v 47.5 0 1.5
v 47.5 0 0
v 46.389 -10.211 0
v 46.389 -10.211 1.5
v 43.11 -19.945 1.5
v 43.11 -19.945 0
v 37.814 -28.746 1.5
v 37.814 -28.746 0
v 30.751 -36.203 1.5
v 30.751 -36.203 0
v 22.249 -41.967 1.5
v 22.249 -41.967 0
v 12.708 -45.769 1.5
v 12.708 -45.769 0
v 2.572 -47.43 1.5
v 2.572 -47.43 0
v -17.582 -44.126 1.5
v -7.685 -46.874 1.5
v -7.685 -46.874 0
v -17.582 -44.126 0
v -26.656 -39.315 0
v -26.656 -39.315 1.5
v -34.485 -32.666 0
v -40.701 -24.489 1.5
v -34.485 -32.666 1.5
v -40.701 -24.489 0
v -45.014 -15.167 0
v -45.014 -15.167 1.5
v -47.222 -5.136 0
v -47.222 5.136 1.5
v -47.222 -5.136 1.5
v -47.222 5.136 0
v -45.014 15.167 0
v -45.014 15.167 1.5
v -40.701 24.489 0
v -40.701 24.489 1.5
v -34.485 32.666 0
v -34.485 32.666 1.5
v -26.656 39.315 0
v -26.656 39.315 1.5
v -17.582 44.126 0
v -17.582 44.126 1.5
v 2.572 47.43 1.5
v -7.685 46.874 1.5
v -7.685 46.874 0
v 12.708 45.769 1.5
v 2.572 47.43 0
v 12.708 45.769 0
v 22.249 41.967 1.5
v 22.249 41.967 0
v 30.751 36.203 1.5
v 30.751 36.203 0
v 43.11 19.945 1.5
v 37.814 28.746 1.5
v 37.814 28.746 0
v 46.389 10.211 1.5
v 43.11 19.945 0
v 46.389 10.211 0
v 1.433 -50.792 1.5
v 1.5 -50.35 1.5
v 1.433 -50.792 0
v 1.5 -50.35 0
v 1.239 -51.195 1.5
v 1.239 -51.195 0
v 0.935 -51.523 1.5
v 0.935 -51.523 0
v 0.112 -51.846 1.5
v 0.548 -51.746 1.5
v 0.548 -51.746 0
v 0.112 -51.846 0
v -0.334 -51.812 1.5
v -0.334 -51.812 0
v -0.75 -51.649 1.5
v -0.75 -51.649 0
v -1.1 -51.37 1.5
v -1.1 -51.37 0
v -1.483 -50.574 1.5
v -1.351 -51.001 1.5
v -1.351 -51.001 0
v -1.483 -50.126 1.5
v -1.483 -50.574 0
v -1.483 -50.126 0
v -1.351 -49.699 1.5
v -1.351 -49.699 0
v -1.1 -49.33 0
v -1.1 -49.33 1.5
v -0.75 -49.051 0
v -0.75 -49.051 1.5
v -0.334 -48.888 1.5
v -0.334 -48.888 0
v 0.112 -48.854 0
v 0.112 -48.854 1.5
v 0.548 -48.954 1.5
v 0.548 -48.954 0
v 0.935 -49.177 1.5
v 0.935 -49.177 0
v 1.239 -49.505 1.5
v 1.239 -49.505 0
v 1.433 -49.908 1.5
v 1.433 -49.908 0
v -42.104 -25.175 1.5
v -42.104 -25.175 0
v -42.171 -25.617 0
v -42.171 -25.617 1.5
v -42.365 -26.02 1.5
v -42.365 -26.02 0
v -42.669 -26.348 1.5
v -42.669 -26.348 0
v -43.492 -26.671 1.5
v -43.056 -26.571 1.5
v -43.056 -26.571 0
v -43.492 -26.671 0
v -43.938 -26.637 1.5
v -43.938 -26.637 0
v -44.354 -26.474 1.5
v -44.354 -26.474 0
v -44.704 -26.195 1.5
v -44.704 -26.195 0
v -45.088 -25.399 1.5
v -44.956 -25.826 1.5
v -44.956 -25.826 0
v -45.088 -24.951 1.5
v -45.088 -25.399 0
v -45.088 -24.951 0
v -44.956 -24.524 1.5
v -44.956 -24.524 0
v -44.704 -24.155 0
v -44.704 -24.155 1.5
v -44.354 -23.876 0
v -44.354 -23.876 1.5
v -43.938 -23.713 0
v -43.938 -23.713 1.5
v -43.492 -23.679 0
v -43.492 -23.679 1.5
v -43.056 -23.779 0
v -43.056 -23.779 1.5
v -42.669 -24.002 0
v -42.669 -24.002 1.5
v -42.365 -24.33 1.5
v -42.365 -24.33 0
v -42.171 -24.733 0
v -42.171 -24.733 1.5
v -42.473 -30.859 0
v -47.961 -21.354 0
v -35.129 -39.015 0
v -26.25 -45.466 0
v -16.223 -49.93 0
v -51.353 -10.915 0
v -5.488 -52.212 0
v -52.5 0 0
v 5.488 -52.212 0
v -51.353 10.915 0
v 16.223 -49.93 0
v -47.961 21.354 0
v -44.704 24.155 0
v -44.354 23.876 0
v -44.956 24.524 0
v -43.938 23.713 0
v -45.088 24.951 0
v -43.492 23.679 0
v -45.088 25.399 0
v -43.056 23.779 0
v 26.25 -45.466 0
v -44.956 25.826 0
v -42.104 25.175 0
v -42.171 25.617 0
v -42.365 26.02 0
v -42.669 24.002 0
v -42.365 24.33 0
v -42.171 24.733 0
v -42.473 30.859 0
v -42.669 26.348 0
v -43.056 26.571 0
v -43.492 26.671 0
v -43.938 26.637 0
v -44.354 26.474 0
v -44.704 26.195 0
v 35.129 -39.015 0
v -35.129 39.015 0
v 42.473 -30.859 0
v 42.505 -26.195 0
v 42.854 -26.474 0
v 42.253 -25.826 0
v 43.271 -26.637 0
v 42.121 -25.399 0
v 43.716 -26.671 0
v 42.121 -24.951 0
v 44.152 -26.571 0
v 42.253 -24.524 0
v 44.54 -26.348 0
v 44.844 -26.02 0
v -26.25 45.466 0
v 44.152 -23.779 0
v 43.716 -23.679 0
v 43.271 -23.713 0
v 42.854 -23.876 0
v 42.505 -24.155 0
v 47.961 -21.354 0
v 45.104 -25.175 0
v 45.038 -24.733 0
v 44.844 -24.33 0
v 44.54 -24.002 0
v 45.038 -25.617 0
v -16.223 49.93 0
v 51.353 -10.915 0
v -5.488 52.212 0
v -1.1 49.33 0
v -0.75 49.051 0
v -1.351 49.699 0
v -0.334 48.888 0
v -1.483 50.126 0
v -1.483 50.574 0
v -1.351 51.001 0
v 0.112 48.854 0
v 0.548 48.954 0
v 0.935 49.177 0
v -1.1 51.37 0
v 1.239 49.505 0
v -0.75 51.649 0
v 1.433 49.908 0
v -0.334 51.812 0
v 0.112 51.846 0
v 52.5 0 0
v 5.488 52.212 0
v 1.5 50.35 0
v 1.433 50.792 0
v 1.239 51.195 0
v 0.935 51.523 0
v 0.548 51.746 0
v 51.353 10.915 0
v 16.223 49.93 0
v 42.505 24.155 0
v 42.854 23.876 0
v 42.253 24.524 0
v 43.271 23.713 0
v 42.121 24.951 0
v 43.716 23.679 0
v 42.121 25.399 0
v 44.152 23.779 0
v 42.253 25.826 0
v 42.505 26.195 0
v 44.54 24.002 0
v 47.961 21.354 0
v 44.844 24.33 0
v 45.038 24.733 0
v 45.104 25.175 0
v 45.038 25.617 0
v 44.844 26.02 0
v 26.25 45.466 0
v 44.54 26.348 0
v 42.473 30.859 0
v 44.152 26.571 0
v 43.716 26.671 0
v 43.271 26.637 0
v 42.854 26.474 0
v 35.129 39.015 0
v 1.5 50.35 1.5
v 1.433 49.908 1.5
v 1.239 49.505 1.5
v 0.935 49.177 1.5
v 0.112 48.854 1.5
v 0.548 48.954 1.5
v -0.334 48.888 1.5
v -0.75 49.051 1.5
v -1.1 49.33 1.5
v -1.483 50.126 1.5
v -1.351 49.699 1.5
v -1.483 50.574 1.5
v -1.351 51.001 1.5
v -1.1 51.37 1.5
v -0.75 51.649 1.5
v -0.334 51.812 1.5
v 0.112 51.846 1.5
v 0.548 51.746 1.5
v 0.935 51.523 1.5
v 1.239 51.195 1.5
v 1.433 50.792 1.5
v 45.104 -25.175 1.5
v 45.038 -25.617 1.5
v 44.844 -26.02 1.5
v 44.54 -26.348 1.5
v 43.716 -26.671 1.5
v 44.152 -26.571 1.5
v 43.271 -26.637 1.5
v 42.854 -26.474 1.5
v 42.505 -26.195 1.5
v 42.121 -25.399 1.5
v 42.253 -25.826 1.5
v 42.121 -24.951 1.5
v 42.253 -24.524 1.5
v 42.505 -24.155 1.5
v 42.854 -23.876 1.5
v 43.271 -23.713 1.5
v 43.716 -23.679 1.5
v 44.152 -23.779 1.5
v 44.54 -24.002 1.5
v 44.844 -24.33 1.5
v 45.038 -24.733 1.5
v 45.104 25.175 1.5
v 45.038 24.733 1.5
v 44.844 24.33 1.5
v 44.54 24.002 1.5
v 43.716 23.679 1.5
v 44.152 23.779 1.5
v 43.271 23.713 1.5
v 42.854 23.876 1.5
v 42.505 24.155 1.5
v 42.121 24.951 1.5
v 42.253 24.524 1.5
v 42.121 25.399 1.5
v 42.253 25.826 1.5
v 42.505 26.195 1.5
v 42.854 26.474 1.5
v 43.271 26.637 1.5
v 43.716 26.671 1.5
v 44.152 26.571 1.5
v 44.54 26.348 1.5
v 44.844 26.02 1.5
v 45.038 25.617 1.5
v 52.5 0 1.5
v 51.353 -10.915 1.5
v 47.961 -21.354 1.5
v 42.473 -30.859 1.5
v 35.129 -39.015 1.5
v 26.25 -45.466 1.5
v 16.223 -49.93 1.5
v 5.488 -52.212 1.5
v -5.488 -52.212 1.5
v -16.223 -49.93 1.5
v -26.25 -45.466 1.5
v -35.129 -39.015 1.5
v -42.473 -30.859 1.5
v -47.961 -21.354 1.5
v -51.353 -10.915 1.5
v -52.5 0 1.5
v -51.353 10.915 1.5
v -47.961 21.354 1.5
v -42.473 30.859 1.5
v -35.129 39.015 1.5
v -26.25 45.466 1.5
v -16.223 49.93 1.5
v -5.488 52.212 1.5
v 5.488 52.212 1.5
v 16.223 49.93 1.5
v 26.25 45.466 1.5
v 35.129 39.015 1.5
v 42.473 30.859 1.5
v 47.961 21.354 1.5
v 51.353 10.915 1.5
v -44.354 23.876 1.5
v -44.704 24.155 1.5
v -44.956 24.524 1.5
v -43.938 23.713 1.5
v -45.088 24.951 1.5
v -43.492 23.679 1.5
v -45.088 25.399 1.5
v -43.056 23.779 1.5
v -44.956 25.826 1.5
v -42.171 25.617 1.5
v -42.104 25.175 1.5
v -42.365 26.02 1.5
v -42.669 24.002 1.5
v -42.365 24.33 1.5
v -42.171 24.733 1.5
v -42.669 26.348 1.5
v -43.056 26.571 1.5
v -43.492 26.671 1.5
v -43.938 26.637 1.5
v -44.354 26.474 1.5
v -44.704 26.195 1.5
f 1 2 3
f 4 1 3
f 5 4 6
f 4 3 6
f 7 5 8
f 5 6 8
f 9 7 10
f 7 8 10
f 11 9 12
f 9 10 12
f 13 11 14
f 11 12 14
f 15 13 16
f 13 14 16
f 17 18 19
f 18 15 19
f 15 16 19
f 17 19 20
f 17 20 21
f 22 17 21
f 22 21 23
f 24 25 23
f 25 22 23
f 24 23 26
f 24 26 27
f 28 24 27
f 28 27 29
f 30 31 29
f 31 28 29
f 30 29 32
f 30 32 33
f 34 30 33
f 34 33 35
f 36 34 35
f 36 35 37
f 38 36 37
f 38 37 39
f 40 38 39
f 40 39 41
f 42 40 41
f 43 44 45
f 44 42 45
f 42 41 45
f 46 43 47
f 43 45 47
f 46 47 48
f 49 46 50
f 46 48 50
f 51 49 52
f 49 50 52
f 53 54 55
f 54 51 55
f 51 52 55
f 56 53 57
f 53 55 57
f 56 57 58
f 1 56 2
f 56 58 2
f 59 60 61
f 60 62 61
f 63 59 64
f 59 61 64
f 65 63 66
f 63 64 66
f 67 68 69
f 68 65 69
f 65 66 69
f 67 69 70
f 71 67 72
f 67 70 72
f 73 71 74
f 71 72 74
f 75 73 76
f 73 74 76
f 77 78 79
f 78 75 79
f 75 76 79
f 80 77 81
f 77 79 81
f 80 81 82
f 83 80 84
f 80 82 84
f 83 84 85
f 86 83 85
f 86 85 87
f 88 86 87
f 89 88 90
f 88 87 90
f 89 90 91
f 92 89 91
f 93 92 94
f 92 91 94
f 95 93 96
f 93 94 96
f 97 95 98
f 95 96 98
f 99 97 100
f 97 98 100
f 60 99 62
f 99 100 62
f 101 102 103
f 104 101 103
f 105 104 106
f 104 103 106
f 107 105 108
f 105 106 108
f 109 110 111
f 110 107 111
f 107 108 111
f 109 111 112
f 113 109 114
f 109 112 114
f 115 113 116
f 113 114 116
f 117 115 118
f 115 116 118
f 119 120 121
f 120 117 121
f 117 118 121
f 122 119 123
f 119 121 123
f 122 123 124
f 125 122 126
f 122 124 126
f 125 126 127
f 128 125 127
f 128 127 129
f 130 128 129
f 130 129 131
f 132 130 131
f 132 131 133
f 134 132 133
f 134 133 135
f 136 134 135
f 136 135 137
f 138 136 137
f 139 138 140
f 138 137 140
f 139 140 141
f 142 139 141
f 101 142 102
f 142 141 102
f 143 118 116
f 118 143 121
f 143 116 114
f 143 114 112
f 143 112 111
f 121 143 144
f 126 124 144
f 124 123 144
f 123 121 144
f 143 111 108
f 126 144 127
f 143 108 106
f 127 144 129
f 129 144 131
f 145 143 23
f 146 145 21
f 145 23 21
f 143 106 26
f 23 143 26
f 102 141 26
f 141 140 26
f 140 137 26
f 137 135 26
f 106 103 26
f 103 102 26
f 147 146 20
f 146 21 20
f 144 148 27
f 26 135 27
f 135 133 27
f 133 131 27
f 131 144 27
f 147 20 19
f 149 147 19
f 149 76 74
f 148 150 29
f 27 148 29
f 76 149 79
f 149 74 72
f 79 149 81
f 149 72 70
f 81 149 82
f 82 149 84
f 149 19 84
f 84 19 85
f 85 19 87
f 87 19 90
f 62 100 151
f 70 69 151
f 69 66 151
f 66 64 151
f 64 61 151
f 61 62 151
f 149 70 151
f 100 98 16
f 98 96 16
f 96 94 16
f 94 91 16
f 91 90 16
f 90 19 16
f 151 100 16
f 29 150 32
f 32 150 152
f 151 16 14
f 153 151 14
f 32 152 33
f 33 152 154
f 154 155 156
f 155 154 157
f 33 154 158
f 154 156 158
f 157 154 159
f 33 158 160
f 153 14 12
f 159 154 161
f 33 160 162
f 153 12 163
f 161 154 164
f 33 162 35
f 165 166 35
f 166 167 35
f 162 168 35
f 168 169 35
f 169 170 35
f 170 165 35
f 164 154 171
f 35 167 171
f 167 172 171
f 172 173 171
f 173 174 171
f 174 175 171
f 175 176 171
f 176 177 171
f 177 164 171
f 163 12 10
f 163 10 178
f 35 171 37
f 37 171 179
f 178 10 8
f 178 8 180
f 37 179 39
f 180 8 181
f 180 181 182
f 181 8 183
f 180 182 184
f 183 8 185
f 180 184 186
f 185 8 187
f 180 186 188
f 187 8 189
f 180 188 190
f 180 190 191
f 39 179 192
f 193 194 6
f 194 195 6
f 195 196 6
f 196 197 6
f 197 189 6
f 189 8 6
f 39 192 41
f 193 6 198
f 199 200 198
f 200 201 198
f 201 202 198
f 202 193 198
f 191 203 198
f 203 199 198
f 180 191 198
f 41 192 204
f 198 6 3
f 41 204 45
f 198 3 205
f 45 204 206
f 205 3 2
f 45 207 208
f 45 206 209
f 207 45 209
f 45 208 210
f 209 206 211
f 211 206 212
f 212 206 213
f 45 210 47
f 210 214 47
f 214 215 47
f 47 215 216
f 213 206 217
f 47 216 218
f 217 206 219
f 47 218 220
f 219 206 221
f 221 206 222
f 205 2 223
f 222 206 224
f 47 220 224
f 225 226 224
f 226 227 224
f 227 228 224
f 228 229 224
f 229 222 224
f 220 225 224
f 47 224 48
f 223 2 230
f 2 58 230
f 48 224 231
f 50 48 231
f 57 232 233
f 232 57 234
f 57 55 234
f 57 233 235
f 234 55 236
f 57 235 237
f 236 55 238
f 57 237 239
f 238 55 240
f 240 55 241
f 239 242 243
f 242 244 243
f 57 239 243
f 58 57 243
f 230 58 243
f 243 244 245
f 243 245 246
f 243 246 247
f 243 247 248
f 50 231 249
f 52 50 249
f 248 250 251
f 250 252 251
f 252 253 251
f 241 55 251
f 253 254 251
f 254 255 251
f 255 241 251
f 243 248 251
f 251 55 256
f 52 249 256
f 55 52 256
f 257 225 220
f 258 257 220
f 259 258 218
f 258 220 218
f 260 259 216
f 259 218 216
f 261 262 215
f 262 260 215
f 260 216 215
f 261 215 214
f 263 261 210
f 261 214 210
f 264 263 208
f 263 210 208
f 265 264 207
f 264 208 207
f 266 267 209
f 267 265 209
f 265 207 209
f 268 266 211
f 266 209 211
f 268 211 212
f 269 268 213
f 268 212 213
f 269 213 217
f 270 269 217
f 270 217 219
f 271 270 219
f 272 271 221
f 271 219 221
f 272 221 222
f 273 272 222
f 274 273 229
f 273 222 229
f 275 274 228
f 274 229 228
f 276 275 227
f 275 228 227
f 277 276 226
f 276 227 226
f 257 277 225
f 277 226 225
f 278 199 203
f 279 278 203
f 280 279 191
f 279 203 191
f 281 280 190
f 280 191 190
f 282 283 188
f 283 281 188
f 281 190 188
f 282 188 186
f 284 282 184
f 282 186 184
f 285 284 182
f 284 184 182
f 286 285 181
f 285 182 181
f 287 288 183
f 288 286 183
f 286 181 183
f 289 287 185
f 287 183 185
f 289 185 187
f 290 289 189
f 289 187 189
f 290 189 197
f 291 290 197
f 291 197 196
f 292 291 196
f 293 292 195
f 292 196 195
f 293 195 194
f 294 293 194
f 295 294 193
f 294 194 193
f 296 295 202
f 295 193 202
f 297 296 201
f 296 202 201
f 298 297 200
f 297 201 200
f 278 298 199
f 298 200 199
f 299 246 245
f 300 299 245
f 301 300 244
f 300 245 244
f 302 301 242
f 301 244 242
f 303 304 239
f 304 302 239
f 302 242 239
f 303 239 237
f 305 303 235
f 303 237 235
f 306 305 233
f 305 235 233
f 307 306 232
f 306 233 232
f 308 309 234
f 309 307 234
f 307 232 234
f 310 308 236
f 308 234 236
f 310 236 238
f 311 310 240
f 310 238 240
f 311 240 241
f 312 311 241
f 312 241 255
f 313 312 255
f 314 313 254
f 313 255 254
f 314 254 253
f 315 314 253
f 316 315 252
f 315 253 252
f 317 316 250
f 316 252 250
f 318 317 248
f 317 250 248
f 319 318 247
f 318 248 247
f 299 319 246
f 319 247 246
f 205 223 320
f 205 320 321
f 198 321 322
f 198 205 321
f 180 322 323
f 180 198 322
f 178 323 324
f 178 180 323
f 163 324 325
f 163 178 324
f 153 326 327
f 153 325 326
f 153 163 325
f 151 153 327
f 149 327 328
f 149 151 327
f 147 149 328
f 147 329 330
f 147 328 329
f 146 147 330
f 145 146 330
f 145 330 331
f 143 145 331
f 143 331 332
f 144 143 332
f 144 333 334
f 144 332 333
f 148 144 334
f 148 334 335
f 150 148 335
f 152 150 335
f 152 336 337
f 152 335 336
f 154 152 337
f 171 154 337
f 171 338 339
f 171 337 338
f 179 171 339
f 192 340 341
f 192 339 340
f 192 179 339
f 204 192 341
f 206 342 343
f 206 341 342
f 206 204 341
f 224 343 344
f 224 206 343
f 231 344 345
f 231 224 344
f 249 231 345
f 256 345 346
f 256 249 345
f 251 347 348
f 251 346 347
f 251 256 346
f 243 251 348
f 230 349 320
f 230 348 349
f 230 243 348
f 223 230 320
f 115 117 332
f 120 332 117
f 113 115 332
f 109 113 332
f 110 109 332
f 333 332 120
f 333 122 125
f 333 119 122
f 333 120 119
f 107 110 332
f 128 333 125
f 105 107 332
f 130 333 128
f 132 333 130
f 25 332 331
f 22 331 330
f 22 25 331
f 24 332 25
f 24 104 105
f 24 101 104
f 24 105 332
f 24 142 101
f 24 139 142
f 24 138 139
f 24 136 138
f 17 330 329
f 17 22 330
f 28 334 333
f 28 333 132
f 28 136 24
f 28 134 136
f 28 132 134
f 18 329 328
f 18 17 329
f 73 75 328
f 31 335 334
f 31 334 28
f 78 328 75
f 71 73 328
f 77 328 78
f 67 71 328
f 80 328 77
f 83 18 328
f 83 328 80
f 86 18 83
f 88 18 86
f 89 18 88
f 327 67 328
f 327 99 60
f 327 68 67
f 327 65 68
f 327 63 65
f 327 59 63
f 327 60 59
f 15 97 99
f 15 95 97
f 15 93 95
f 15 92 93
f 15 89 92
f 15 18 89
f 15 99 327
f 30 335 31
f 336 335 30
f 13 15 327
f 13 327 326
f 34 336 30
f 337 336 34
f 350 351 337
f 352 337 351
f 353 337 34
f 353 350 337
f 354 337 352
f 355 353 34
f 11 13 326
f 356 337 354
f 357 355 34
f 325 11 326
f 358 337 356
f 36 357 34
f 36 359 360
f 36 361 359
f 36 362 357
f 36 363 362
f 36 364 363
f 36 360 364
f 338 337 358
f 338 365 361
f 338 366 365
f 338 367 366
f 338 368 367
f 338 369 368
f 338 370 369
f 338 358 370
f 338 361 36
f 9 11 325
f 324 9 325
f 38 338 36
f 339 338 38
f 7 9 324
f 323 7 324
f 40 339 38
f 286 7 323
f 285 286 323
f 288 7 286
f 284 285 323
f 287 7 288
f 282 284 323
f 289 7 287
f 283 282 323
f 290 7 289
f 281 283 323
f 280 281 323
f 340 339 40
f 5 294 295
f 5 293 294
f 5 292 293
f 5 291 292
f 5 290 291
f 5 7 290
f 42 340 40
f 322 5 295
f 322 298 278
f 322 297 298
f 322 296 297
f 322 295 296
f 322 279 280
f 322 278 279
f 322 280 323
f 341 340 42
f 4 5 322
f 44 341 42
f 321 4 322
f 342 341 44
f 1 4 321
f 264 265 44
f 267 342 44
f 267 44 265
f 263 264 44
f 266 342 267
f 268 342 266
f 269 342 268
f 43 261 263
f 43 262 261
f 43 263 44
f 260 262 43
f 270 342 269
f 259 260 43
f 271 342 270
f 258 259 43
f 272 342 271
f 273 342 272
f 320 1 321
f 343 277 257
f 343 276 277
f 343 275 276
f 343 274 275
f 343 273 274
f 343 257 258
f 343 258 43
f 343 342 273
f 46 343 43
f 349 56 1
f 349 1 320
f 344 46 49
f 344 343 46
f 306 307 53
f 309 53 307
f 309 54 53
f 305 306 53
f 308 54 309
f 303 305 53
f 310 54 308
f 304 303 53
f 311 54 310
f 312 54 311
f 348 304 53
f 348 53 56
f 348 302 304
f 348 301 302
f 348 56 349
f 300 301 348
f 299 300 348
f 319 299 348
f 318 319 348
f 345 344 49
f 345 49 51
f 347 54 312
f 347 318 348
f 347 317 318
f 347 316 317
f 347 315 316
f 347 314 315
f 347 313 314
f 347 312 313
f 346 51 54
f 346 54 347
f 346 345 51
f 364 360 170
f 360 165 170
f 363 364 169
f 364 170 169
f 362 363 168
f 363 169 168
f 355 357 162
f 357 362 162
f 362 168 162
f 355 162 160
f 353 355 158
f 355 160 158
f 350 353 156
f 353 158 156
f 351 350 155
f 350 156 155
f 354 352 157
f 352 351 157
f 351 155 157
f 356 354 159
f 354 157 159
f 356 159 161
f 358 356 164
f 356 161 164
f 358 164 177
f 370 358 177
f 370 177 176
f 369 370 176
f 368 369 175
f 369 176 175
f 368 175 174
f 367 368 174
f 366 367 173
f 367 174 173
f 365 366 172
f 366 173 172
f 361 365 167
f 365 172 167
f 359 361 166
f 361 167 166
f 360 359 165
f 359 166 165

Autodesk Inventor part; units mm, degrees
ref_plane "YZ Plane" through (0, 0, 0) normal (1, 0, 0) x (0, 1, 0)
ref_plane "XZ Plane" through (0, 0, 0) normal (0, 1, 0) x (-1, 0, 0)
ref_plane "XY Plane" through (0, 0, 0) normal (0, 0, 1) x (1, 0, 0)
sketch "Sketch1" plane through (0, 0, 0) normal (0, 0, 1) x (1, 0, 0)
  circle A0 centre (0, 0) radius 47.5
  circle A1 centre (0, 0) radius 52.5
  circle A2 centre (0, 50.35) radius 1.5
  circle A3 centre (-43.6044, 25.175) radius 1.5
  circle A4 centre (-43.6044, -25.175) radius 1.5
  circle A5 centre (0, -50.35) radius 1.5
  circle A6 centre (43.6044, -25.175) radius 1.5
  circle A7 centre (43.6044, 25.175) radius 1.5
  dimension "d0" = 95
  dimension "d1" = 105
  dimension "d2" = 3
  dimension "d5" = 360
  dimension "d9" = 1.35
extrude "Extrusion1" add sketch "Sketch1" along normal blind 1.5
properties part number "bead lock" material "PCTG 20%"
